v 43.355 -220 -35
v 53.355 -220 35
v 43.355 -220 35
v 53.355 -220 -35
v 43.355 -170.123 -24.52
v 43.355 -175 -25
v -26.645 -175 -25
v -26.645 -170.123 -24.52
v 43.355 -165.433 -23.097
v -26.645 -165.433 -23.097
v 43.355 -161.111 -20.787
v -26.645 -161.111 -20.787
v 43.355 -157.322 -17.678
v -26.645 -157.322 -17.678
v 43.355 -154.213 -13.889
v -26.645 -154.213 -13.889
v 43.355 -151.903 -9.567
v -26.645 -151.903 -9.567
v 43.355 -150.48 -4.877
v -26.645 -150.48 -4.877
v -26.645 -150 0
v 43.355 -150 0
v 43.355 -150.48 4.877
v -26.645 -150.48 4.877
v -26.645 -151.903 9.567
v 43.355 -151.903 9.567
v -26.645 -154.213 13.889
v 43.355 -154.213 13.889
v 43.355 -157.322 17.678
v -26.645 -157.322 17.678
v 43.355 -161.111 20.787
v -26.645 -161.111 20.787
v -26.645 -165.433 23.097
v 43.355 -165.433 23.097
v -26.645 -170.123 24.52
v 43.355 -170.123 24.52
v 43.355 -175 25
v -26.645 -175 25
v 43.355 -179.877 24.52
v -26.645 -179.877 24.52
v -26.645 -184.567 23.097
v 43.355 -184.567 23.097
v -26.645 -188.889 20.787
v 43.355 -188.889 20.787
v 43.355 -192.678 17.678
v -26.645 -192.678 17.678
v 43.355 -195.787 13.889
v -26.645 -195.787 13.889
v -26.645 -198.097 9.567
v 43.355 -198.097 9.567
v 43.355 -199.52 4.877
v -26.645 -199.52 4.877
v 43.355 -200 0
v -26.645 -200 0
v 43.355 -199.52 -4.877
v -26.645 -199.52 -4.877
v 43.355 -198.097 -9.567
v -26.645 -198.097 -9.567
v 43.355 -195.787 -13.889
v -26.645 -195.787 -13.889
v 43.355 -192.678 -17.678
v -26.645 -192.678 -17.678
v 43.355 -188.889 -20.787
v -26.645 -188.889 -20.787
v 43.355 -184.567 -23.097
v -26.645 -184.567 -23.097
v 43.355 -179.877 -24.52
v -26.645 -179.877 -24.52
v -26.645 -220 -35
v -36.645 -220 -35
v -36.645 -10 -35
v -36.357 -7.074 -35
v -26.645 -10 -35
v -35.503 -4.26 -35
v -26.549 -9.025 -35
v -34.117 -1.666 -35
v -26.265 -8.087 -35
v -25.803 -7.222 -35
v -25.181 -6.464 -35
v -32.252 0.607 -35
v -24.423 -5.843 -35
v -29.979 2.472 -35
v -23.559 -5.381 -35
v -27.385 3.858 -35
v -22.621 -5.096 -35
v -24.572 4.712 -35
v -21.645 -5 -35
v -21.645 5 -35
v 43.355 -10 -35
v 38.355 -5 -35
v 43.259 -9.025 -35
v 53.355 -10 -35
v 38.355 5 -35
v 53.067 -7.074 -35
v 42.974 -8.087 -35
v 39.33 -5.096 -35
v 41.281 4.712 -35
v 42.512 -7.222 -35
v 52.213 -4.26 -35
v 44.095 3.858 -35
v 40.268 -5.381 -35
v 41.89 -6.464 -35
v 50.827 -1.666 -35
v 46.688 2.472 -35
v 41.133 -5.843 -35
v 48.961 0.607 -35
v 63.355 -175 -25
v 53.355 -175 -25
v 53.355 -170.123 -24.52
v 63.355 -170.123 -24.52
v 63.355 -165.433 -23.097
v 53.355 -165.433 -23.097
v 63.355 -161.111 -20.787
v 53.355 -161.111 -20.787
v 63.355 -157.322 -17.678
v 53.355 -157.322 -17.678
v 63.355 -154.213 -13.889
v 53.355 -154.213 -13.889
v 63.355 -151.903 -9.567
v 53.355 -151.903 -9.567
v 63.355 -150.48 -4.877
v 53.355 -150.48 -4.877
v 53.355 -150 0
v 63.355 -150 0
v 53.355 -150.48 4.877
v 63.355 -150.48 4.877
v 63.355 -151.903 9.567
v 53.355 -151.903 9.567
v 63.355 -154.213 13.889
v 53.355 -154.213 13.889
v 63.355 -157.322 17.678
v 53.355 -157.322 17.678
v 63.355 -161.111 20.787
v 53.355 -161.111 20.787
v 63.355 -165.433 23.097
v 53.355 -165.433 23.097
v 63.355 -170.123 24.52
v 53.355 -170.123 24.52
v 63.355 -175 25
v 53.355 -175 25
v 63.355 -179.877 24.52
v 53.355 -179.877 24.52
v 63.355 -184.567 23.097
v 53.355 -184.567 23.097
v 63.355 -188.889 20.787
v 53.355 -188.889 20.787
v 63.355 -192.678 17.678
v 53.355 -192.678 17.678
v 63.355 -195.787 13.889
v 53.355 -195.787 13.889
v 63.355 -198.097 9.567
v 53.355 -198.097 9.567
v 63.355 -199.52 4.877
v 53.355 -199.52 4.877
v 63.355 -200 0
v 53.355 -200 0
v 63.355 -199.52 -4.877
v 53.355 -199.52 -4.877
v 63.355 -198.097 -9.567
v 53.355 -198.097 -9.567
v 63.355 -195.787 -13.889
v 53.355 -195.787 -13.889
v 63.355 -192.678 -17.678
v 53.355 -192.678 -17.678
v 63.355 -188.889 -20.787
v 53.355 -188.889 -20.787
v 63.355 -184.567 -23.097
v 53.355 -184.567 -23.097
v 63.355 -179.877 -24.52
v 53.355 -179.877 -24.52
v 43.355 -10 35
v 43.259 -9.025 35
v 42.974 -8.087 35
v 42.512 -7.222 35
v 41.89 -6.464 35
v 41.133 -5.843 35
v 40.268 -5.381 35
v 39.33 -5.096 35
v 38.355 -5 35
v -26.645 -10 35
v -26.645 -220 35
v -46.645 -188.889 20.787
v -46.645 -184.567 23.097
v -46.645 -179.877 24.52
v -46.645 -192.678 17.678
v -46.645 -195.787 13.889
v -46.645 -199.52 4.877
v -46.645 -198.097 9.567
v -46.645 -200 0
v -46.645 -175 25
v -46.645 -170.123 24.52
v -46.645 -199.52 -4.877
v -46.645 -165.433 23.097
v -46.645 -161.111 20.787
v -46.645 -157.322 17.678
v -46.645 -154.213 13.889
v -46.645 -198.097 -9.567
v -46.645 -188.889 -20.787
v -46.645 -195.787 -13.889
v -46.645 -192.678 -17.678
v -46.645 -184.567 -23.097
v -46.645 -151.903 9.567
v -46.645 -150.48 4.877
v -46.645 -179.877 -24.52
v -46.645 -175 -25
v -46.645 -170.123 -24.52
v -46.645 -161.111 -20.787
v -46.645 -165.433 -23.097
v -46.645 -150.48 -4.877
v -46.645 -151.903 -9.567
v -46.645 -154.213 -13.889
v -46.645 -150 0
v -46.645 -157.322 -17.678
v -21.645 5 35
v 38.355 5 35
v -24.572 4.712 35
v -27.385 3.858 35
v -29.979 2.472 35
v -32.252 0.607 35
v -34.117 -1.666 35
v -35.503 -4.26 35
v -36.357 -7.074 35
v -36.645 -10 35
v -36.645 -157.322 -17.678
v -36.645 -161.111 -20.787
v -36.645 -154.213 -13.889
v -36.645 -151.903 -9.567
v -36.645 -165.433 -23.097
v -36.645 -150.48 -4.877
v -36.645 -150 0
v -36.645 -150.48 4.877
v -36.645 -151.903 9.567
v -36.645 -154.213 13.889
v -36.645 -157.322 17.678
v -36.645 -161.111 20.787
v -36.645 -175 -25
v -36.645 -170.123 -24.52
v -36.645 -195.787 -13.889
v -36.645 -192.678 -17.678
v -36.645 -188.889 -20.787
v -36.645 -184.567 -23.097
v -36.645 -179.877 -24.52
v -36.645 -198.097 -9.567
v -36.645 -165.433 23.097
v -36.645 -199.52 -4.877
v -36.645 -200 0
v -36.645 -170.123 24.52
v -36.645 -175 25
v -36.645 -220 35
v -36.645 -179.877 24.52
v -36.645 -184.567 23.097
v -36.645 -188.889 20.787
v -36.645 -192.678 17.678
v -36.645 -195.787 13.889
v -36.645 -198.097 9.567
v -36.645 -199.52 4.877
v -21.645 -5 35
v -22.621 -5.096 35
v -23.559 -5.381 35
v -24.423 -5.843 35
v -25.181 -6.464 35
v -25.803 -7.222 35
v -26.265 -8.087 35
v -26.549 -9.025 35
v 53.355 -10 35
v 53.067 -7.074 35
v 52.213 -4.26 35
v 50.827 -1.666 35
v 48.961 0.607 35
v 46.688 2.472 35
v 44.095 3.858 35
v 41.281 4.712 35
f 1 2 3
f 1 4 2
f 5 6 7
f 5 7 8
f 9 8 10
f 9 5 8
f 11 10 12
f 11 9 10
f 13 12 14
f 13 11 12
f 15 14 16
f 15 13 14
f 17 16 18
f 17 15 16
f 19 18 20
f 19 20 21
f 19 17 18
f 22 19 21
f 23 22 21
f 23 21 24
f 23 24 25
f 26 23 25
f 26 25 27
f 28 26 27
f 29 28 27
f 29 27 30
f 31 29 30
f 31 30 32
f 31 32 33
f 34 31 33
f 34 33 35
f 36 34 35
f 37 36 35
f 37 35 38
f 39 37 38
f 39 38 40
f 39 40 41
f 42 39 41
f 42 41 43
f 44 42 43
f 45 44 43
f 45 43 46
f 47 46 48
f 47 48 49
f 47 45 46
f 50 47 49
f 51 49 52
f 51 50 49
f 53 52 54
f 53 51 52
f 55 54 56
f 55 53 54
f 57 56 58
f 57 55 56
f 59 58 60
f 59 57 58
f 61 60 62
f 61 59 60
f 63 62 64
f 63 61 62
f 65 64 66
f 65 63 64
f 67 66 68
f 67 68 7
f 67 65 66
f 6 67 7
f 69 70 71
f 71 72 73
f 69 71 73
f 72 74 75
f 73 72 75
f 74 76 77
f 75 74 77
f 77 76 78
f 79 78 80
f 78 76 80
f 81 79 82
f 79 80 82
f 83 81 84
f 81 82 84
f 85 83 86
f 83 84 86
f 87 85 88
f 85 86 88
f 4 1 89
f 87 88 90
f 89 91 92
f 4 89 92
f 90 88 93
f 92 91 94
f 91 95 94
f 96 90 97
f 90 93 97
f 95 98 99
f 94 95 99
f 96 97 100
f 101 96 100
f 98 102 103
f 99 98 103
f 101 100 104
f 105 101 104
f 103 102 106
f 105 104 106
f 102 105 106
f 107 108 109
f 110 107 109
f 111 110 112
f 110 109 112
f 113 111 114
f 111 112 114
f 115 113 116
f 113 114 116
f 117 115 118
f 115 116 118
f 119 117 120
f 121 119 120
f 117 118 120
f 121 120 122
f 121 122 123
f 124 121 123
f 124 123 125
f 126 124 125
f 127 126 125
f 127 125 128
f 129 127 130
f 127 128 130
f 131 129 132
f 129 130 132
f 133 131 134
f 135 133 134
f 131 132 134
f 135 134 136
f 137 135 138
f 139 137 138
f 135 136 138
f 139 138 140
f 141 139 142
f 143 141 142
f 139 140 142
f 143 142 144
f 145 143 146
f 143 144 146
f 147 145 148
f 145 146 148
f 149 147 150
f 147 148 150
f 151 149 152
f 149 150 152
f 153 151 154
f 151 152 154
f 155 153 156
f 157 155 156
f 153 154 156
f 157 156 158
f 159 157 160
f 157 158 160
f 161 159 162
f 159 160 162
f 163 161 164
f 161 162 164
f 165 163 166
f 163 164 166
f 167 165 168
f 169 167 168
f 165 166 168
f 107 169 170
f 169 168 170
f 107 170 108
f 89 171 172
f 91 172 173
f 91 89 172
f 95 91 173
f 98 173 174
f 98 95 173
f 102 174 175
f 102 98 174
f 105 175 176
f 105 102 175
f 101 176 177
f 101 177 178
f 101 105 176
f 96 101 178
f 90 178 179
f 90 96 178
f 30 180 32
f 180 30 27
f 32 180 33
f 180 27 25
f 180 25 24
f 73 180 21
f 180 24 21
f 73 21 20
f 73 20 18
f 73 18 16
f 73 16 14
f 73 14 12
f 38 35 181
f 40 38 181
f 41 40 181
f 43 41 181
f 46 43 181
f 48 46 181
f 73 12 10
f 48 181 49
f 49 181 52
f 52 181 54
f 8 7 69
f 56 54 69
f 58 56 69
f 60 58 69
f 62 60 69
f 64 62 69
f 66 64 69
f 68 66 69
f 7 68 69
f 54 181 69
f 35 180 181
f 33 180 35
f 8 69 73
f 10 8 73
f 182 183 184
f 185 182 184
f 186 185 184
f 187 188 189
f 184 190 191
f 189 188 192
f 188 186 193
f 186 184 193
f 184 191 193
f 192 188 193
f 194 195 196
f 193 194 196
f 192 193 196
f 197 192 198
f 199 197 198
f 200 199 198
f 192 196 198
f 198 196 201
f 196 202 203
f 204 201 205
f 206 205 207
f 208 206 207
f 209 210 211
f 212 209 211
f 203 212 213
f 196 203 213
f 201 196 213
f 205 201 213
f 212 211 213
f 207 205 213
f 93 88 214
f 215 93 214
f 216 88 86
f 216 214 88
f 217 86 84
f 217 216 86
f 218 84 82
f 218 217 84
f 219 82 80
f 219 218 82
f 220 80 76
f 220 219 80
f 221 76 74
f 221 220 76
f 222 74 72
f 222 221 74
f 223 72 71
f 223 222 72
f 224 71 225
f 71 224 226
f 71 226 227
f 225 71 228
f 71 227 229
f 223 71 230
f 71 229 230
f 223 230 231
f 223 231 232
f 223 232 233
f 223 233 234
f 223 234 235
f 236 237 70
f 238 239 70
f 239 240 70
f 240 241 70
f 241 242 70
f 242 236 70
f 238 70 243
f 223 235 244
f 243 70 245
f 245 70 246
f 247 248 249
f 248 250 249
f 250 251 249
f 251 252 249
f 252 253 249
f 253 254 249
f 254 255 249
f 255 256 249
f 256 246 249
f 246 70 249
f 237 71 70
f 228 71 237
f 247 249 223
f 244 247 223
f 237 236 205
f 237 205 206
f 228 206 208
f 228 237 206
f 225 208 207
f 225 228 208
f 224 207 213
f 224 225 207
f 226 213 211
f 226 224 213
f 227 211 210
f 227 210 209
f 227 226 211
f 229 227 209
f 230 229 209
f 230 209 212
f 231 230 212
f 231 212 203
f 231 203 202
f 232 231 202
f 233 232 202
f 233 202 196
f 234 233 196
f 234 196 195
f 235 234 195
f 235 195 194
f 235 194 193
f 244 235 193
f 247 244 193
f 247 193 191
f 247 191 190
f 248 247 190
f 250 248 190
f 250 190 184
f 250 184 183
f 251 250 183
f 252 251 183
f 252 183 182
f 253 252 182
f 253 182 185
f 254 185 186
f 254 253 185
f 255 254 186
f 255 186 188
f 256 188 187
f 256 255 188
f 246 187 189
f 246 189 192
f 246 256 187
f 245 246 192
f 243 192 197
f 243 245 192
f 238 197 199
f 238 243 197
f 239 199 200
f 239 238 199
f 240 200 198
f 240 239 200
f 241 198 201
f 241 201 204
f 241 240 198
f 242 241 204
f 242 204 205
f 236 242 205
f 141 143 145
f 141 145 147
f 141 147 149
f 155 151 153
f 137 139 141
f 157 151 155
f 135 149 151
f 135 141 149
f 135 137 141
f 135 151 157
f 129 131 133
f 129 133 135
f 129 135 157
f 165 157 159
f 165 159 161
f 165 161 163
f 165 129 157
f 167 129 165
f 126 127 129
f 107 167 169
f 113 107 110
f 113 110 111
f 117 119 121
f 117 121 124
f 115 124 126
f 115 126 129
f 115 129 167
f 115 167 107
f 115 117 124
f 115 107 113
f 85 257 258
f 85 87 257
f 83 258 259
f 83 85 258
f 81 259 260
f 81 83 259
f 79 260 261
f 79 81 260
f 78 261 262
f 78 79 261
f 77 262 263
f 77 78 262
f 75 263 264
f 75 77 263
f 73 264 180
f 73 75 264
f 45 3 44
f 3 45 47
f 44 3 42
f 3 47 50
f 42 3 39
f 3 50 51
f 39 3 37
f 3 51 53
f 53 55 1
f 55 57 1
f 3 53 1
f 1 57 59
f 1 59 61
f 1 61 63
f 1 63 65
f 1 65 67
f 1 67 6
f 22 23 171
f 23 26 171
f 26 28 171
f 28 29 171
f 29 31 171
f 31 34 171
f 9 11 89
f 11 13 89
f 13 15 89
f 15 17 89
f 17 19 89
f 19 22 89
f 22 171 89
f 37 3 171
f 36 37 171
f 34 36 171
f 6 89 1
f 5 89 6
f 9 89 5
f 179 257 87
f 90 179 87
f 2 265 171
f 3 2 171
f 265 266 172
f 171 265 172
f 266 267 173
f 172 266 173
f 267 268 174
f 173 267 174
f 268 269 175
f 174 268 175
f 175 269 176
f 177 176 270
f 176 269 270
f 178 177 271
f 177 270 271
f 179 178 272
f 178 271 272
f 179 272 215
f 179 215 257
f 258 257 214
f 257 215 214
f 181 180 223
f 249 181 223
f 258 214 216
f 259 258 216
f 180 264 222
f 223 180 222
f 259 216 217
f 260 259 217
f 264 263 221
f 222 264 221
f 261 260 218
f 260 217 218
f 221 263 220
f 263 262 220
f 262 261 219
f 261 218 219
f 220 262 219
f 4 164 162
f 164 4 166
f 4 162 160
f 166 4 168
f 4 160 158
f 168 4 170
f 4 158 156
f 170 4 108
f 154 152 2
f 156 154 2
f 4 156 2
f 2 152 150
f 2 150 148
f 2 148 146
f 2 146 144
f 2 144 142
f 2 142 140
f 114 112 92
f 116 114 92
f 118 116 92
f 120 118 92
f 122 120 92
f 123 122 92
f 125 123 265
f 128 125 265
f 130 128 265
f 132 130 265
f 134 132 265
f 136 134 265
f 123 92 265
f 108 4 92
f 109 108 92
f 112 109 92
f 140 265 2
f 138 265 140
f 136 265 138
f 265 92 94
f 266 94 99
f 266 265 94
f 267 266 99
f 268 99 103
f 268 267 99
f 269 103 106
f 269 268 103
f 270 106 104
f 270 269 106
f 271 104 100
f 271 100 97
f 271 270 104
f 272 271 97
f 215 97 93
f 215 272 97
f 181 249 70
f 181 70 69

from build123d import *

# Parameters (mm, degrees)
SKETCH2_W                = 70
SKETCH2_H                = 10
SKETCH3_R                = 25
CUT_EXTRUDE1_DEPTH       = 91
SKETCH4_R                = 25
BOSS_EXTRUDE1_DEPTH      = 10
BOSS_EXTRUDE1_DEPTH_BACK = 100


with BuildPart() as part:
    # Sweep1: sweep along a path in Sketch1
    with BuildLine(Plane.XY) as sweep1_path:
        Line((48.354821102, -220), (48.354821102, -10))
        ThreePointArc((48.354821102, -10), (45.425888913, -2.928932188), (38.354821102, 0))
        Line((38.354821102, 0), (-21.645178898, 0))
        ThreePointArc((-21.645178898, 0), (-28.71624671, -2.928932188), (-31.645178898, -10))
        Line((-31.645178898, -10), (-31.645178898, -220))
    # Sketch2 → Sweep1 (sweep)
    with BuildSketch(Plane(origin=(0, 0, 0), x_dir=(0, 0, -1), z_dir=(1, 0, 0))):
        Rectangle(SKETCH2_W, SKETCH2_H)
    sweep(path=sweep1_path.line)

    # Sketch3 → Cut-Extrude1 (cut, through all)
    with BuildSketch(Plane(origin=(53.354821102, 0, 0), x_dir=(0, 0, -1), z_dir=(1, 0, 0))):
        with Locations((0, -175)):
            Circle(SKETCH3_R)
    extrude(amount=-CUT_EXTRUDE1_DEPTH, mode=Mode.SUBTRACT)

    # Sketch4 → Boss-Extrude1 (add, two sides)
    with BuildSketch(Plane(origin=(53.354821102, 0, 0), x_dir=(0, 0, -1), z_dir=(1, 0, 0))) as boss_extrude1_sk:
        with Locations((0, -175)):
            Circle(SKETCH4_R)
    extrude(amount=BOSS_EXTRUDE1_DEPTH)
    extrude(boss_extrude1_sk.sketch, amount=-BOSS_EXTRUDE1_DEPTH_BACK)


solid = part.part
